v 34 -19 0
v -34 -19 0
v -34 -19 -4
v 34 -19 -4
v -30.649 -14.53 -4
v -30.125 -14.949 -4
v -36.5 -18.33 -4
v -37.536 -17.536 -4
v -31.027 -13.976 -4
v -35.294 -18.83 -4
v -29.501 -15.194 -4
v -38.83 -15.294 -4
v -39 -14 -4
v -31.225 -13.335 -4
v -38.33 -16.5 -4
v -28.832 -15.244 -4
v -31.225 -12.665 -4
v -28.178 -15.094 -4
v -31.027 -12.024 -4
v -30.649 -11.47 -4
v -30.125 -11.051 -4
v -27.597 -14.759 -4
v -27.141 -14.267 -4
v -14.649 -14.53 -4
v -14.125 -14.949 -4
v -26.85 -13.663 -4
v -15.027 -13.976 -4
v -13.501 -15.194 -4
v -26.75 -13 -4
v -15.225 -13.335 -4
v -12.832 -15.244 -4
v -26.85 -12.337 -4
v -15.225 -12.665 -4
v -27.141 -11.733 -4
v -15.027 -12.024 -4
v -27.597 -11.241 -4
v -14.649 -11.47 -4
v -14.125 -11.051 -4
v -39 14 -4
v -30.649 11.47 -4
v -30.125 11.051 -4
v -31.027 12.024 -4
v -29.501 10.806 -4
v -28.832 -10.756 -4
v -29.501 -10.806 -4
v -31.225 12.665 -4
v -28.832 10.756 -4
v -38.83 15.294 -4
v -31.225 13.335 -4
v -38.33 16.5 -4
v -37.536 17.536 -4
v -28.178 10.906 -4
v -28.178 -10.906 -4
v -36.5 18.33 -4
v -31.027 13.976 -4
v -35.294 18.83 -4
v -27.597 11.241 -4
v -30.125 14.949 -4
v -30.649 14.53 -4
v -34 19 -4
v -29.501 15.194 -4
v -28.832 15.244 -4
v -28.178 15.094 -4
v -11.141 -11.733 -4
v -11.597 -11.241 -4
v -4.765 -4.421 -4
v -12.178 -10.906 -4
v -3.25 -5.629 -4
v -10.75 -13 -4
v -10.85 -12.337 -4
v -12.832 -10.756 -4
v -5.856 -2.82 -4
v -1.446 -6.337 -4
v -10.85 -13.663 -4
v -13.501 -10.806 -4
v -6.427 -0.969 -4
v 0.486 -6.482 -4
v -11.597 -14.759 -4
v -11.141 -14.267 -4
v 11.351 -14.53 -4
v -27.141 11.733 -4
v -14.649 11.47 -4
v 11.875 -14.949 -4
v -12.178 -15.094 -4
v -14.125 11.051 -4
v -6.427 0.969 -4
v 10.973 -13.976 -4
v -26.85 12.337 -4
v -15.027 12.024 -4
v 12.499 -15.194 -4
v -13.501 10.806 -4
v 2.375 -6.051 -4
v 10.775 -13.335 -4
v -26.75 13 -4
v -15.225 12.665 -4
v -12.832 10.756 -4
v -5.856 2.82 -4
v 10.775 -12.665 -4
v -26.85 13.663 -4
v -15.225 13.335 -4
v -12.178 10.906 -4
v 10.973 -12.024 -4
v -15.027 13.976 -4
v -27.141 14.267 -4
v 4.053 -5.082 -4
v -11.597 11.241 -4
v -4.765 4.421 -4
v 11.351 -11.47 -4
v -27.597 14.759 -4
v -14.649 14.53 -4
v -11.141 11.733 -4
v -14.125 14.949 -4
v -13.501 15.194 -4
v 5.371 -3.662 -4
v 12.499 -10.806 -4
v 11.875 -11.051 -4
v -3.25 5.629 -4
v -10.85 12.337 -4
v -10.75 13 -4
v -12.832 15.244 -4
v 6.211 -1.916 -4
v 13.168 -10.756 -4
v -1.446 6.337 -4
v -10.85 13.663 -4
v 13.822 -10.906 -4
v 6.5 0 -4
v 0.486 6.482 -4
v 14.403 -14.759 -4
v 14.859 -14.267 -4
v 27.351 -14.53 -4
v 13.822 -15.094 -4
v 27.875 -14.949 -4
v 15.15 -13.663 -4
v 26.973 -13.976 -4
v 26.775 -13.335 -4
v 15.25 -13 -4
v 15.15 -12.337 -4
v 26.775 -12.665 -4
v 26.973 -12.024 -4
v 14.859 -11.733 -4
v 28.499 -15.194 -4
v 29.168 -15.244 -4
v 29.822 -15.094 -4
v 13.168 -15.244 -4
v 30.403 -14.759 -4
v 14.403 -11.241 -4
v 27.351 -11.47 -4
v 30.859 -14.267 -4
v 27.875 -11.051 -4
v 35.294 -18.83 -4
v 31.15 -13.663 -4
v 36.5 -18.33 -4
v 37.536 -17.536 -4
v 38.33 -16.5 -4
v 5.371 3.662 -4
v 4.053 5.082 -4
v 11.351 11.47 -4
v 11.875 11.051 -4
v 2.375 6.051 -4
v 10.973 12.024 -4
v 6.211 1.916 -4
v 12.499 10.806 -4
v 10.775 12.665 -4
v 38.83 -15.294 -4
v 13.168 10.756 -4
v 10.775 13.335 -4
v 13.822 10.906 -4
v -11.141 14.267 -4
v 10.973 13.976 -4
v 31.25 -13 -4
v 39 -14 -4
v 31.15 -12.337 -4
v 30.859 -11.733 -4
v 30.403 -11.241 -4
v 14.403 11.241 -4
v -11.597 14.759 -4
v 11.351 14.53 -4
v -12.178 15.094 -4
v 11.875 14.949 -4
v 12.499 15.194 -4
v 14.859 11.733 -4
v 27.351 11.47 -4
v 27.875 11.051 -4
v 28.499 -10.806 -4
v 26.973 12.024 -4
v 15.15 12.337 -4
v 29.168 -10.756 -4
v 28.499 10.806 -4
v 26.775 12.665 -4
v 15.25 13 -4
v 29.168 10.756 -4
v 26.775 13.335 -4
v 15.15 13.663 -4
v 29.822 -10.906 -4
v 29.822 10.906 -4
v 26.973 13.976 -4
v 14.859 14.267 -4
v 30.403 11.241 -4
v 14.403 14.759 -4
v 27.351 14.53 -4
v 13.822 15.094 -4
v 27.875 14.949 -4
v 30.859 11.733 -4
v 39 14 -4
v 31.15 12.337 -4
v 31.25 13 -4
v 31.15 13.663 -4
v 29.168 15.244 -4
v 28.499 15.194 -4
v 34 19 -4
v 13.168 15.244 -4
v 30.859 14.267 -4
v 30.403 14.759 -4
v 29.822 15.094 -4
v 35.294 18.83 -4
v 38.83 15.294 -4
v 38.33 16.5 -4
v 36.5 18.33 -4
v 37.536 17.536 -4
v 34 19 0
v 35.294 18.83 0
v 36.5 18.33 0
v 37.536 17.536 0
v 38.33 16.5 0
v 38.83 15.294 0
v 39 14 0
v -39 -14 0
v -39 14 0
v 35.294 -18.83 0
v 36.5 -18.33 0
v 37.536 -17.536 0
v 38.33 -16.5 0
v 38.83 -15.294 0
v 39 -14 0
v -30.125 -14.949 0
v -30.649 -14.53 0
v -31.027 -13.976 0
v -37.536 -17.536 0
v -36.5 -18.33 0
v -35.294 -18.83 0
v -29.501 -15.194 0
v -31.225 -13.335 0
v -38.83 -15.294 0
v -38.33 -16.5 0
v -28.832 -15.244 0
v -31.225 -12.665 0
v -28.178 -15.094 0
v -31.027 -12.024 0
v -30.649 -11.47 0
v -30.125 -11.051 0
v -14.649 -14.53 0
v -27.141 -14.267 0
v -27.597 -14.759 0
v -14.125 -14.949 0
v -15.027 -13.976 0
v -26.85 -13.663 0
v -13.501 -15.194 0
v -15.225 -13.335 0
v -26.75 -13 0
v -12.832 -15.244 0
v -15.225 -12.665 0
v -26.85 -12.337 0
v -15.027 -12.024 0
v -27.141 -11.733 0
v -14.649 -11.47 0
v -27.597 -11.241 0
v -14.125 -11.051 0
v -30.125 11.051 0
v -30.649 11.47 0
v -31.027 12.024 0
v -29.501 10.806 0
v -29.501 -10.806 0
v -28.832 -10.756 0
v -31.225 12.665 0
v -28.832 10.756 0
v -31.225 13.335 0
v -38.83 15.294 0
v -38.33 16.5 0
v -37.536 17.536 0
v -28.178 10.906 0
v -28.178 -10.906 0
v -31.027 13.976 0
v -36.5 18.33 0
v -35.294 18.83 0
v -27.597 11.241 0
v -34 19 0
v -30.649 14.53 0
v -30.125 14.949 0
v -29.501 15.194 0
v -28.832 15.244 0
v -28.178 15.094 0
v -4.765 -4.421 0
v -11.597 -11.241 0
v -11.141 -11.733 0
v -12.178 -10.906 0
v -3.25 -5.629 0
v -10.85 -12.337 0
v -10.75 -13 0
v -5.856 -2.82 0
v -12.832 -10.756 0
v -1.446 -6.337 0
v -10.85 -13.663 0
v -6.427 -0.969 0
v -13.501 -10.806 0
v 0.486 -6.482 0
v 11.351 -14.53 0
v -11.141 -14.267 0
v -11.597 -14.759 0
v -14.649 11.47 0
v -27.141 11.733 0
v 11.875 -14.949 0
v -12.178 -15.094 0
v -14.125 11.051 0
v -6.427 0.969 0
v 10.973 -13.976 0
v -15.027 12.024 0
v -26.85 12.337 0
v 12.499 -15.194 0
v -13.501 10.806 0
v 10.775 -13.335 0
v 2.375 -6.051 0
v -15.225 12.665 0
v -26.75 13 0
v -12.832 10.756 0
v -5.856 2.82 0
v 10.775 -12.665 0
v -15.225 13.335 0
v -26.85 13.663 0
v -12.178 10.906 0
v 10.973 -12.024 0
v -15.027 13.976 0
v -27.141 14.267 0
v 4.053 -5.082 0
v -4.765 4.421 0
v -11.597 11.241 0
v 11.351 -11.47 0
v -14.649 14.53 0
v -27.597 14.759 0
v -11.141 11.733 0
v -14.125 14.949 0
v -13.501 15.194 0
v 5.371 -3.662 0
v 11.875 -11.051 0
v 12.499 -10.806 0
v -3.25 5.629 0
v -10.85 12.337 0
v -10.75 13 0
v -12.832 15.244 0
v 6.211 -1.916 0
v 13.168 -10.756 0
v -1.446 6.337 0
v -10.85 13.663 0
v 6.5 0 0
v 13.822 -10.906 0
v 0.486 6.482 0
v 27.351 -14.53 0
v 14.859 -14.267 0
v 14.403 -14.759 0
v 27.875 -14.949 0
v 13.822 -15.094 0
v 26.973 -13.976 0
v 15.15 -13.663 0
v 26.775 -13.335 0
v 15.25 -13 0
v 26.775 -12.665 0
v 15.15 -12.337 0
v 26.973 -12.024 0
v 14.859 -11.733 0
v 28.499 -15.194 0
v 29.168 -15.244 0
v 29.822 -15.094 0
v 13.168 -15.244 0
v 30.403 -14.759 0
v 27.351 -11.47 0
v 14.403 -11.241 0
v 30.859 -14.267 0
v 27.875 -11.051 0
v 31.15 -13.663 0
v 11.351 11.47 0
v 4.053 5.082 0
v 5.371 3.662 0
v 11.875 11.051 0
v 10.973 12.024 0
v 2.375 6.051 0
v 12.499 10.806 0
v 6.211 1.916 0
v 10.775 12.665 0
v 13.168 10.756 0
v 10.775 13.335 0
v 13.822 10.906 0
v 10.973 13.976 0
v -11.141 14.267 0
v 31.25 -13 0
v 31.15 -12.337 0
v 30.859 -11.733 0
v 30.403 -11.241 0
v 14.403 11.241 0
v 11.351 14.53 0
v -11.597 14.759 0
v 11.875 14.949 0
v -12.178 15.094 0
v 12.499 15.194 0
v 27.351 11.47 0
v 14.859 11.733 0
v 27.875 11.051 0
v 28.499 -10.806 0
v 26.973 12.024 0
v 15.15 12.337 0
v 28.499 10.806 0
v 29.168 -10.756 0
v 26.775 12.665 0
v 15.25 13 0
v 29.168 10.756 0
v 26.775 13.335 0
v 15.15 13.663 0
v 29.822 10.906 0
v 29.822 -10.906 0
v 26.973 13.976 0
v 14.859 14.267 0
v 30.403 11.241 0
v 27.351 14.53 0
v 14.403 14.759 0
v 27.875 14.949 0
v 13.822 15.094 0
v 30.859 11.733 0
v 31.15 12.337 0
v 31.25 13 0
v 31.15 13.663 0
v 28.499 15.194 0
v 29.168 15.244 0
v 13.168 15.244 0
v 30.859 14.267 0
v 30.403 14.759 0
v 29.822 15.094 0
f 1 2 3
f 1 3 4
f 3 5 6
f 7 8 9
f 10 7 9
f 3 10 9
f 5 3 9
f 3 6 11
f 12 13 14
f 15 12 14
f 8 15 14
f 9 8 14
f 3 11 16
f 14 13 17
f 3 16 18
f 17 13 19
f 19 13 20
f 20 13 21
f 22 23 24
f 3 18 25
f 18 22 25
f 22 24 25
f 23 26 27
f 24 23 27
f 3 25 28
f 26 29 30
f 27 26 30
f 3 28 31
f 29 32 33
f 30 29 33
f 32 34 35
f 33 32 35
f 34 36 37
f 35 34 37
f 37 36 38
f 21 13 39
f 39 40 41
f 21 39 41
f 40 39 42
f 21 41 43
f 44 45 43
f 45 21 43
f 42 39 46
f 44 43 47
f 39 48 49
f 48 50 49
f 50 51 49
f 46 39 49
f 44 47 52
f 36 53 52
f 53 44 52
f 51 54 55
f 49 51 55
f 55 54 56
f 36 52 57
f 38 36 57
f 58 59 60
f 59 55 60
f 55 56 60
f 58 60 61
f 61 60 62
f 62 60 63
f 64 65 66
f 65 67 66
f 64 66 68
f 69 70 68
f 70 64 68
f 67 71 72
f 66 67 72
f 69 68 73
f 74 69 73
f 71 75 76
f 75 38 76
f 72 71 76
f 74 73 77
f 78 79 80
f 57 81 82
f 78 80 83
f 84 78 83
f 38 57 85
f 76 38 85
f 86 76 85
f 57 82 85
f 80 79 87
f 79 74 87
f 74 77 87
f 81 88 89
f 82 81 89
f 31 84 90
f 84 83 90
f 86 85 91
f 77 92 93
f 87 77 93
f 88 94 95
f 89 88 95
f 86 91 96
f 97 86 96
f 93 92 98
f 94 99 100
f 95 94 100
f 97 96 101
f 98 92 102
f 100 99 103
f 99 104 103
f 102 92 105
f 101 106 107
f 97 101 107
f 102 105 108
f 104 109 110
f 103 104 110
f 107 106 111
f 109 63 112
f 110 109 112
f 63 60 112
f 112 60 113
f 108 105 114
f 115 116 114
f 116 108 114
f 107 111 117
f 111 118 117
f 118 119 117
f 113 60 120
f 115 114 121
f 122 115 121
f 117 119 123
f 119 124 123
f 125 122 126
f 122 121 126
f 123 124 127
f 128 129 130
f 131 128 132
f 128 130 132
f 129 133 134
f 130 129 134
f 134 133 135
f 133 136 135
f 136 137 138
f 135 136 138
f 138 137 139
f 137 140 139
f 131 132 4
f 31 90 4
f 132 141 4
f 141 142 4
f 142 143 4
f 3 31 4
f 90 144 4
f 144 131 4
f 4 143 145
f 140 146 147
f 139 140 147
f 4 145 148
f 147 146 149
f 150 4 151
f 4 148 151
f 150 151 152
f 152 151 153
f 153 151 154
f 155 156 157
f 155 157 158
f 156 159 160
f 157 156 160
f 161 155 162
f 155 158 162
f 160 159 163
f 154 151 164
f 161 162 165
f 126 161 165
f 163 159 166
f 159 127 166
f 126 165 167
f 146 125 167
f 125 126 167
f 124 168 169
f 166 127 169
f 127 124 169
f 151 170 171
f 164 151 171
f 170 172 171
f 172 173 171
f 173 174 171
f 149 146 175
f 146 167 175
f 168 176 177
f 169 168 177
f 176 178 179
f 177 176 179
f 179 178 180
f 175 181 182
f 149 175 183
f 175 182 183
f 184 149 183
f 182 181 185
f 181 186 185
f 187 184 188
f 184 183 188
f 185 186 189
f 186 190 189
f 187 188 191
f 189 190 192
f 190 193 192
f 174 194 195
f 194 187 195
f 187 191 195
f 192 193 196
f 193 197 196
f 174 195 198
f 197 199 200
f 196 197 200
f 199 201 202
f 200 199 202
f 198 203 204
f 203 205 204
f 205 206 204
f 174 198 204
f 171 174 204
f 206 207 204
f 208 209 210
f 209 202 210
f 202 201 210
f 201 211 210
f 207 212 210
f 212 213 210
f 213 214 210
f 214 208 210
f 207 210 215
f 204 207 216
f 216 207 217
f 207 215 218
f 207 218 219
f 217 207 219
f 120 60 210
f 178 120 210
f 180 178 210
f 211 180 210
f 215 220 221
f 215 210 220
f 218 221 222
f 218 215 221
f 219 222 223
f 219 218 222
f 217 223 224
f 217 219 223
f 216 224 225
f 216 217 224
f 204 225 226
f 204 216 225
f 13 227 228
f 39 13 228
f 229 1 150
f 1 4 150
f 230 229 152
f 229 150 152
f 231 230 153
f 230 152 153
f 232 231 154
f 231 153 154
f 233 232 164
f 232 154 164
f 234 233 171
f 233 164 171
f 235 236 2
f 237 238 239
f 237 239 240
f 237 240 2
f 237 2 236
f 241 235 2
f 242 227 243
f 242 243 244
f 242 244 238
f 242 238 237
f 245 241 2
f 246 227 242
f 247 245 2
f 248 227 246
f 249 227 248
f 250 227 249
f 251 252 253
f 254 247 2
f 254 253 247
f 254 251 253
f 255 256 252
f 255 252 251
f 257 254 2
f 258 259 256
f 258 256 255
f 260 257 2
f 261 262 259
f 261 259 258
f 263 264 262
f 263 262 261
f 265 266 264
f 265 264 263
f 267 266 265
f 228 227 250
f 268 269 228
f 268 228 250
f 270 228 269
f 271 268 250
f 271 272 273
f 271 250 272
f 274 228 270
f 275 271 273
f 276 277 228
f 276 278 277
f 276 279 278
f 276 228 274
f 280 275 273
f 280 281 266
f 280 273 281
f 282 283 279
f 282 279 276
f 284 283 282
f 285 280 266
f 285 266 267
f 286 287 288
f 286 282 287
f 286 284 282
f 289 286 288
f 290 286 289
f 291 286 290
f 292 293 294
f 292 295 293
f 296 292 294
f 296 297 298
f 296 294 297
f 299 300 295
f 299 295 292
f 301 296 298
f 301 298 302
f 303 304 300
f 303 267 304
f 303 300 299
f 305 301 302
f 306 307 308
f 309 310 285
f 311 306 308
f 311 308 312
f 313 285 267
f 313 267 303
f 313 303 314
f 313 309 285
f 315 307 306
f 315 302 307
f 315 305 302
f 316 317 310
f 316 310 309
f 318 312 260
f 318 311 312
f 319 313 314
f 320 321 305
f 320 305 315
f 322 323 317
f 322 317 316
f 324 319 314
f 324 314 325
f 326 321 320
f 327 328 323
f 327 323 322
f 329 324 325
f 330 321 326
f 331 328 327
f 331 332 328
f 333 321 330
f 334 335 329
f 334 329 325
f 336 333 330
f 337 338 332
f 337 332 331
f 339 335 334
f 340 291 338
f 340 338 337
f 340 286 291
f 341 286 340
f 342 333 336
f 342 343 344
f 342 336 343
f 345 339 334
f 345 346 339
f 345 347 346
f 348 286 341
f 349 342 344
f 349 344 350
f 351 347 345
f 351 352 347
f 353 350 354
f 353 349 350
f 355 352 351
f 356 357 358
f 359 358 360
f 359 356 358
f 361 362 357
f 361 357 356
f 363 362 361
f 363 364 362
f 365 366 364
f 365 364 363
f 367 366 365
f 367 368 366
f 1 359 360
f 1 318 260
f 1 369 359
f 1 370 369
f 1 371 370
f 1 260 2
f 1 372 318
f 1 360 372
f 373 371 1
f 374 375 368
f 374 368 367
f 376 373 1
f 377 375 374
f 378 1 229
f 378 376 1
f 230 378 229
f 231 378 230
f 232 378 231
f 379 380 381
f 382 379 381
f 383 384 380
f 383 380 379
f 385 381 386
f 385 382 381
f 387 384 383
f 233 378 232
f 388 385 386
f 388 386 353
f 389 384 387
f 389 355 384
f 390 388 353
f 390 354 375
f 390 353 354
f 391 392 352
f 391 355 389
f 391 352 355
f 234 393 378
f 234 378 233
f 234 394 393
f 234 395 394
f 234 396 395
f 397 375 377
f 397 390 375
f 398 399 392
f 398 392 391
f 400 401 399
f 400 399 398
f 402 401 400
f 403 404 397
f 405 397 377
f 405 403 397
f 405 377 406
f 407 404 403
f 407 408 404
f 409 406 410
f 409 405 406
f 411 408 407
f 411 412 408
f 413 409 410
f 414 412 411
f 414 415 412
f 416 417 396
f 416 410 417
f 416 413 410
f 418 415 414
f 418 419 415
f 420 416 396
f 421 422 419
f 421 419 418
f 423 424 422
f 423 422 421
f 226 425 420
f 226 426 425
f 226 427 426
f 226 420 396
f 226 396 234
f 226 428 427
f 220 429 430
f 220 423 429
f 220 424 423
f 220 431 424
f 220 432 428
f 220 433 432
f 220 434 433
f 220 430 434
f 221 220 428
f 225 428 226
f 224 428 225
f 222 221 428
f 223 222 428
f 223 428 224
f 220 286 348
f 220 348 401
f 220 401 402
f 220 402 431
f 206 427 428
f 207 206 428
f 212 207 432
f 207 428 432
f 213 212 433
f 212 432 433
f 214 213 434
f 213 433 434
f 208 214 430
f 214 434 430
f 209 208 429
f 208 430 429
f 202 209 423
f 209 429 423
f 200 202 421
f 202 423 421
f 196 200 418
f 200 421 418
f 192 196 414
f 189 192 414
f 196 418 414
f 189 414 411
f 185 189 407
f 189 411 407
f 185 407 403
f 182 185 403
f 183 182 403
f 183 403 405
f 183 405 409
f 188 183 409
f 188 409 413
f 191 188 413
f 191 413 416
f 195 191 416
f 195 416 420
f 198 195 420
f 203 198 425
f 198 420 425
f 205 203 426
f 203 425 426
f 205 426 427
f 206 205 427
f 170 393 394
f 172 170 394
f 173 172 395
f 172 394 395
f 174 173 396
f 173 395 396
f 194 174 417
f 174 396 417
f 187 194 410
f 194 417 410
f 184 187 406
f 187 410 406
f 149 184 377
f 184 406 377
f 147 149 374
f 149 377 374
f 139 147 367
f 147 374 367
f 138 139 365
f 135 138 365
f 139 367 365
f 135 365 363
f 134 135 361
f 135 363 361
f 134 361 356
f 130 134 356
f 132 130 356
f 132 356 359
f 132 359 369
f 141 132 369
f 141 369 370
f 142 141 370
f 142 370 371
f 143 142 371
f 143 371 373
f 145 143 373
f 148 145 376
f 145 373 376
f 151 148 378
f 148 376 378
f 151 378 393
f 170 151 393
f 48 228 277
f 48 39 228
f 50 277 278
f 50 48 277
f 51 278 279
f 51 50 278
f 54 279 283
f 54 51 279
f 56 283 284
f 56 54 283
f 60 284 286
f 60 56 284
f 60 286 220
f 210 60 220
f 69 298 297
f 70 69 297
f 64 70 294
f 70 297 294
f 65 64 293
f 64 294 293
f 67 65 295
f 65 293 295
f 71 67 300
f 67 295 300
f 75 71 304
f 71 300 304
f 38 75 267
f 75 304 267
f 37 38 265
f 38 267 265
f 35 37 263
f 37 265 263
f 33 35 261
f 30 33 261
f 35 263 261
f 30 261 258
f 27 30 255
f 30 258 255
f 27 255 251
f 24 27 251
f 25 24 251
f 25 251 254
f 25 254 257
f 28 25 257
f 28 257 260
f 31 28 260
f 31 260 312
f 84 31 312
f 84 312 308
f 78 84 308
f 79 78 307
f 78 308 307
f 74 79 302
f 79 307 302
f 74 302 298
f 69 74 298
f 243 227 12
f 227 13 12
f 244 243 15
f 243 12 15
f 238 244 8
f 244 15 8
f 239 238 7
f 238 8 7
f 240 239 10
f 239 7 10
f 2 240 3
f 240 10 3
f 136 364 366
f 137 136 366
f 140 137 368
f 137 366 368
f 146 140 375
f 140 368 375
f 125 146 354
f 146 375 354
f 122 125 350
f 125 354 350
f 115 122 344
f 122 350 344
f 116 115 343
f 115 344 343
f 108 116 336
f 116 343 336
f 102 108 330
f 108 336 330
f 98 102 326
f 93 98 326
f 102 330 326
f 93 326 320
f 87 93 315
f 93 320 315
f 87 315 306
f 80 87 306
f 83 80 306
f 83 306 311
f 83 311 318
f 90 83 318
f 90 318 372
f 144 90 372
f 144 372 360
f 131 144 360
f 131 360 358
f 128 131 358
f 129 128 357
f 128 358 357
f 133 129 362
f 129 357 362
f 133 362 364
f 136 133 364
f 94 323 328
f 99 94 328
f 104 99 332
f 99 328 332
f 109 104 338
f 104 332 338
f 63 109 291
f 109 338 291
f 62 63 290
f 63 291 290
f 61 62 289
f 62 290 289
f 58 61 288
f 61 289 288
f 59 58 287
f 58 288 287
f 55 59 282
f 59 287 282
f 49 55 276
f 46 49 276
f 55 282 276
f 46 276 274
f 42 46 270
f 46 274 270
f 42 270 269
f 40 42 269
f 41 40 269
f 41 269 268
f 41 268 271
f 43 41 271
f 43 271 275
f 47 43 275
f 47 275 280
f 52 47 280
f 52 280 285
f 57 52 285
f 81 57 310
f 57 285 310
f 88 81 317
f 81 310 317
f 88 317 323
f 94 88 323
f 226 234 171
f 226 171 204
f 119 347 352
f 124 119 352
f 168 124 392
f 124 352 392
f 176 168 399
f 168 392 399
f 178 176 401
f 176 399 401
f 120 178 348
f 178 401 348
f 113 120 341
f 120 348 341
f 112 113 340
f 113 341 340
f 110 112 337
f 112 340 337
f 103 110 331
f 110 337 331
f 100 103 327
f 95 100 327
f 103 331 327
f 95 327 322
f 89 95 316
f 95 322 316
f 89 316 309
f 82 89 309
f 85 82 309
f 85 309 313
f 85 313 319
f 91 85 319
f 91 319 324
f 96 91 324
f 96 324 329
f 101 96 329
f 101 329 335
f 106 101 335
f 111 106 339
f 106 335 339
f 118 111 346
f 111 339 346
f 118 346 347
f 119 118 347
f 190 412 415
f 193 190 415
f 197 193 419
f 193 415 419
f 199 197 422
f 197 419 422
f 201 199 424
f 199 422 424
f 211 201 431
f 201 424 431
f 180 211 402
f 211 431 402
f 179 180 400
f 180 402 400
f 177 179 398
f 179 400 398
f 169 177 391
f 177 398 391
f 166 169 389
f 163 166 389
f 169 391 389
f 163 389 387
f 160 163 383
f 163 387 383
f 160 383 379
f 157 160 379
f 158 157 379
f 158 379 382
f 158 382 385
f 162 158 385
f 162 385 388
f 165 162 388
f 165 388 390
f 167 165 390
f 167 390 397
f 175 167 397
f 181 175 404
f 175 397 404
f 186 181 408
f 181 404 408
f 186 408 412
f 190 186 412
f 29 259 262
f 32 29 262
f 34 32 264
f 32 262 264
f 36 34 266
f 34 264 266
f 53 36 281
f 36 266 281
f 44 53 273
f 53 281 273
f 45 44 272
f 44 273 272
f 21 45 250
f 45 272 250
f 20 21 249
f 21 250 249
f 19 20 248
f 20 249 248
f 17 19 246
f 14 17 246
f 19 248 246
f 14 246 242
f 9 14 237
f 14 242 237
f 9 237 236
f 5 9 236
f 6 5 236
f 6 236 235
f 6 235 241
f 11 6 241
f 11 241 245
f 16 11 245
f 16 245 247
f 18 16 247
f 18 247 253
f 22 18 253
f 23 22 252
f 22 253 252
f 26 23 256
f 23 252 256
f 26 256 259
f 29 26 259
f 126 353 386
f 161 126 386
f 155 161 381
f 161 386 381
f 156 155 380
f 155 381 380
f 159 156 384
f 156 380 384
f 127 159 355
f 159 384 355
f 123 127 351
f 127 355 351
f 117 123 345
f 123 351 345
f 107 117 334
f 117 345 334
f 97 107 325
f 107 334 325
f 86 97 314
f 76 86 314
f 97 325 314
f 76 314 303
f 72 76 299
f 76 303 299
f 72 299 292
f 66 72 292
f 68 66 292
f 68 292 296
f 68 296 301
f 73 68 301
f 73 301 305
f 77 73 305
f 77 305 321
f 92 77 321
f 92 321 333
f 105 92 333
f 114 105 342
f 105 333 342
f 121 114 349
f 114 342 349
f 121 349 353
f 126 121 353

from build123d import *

# Parameters (mm, degrees)
F0_W     = 78
F0_H     = 38
F0_R     = 2.25
F0_R_2   = 6.5
F1_DEPTH = 4
F2_R     = 5


# Not quite as in the source:
# - a feature names something its author has since deleted; it is built from what else it names


with BuildPart() as f1:
    # F0 (on Top) → F1 (new body)
    with BuildSketch(Plane.XY):
        Rectangle(F0_W, F0_H)
        with Locations((-29, -13)):
            Circle(F0_R, mode=Mode.SUBTRACT)
        with Locations((-13, -13)):
            Circle(F0_R, mode=Mode.SUBTRACT)
        with Locations((13, -13)):
            Circle(F0_R, mode=Mode.SUBTRACT)
        with Locations((29, -13)):
            Circle(F0_R, mode=Mode.SUBTRACT)
        with Locations((-29, 13)):
            Circle(F0_R, mode=Mode.SUBTRACT)
        with Locations((-13, 13)):
            Circle(F0_R, mode=Mode.SUBTRACT)
        Circle(F0_R_2, mode=Mode.SUBTRACT)
        with Locations((13, 13)):
            Circle(F0_R, mode=Mode.SUBTRACT)
        with Locations((29, 13)):
            Circle(F0_R, mode=Mode.SUBTRACT)
    extrude(amount=-F1_DEPTH)

    # F2
    f2_edges = [f1.edges().sort_by_distance(p)[0] for p in [
        (-39, -19, -2),
        (39, -19, -2),
        (39, 19, -2),
        (-39, 19, -2),
    ]]
    fillet(f2_edges, radius=F2_R)


solid = f1.part
